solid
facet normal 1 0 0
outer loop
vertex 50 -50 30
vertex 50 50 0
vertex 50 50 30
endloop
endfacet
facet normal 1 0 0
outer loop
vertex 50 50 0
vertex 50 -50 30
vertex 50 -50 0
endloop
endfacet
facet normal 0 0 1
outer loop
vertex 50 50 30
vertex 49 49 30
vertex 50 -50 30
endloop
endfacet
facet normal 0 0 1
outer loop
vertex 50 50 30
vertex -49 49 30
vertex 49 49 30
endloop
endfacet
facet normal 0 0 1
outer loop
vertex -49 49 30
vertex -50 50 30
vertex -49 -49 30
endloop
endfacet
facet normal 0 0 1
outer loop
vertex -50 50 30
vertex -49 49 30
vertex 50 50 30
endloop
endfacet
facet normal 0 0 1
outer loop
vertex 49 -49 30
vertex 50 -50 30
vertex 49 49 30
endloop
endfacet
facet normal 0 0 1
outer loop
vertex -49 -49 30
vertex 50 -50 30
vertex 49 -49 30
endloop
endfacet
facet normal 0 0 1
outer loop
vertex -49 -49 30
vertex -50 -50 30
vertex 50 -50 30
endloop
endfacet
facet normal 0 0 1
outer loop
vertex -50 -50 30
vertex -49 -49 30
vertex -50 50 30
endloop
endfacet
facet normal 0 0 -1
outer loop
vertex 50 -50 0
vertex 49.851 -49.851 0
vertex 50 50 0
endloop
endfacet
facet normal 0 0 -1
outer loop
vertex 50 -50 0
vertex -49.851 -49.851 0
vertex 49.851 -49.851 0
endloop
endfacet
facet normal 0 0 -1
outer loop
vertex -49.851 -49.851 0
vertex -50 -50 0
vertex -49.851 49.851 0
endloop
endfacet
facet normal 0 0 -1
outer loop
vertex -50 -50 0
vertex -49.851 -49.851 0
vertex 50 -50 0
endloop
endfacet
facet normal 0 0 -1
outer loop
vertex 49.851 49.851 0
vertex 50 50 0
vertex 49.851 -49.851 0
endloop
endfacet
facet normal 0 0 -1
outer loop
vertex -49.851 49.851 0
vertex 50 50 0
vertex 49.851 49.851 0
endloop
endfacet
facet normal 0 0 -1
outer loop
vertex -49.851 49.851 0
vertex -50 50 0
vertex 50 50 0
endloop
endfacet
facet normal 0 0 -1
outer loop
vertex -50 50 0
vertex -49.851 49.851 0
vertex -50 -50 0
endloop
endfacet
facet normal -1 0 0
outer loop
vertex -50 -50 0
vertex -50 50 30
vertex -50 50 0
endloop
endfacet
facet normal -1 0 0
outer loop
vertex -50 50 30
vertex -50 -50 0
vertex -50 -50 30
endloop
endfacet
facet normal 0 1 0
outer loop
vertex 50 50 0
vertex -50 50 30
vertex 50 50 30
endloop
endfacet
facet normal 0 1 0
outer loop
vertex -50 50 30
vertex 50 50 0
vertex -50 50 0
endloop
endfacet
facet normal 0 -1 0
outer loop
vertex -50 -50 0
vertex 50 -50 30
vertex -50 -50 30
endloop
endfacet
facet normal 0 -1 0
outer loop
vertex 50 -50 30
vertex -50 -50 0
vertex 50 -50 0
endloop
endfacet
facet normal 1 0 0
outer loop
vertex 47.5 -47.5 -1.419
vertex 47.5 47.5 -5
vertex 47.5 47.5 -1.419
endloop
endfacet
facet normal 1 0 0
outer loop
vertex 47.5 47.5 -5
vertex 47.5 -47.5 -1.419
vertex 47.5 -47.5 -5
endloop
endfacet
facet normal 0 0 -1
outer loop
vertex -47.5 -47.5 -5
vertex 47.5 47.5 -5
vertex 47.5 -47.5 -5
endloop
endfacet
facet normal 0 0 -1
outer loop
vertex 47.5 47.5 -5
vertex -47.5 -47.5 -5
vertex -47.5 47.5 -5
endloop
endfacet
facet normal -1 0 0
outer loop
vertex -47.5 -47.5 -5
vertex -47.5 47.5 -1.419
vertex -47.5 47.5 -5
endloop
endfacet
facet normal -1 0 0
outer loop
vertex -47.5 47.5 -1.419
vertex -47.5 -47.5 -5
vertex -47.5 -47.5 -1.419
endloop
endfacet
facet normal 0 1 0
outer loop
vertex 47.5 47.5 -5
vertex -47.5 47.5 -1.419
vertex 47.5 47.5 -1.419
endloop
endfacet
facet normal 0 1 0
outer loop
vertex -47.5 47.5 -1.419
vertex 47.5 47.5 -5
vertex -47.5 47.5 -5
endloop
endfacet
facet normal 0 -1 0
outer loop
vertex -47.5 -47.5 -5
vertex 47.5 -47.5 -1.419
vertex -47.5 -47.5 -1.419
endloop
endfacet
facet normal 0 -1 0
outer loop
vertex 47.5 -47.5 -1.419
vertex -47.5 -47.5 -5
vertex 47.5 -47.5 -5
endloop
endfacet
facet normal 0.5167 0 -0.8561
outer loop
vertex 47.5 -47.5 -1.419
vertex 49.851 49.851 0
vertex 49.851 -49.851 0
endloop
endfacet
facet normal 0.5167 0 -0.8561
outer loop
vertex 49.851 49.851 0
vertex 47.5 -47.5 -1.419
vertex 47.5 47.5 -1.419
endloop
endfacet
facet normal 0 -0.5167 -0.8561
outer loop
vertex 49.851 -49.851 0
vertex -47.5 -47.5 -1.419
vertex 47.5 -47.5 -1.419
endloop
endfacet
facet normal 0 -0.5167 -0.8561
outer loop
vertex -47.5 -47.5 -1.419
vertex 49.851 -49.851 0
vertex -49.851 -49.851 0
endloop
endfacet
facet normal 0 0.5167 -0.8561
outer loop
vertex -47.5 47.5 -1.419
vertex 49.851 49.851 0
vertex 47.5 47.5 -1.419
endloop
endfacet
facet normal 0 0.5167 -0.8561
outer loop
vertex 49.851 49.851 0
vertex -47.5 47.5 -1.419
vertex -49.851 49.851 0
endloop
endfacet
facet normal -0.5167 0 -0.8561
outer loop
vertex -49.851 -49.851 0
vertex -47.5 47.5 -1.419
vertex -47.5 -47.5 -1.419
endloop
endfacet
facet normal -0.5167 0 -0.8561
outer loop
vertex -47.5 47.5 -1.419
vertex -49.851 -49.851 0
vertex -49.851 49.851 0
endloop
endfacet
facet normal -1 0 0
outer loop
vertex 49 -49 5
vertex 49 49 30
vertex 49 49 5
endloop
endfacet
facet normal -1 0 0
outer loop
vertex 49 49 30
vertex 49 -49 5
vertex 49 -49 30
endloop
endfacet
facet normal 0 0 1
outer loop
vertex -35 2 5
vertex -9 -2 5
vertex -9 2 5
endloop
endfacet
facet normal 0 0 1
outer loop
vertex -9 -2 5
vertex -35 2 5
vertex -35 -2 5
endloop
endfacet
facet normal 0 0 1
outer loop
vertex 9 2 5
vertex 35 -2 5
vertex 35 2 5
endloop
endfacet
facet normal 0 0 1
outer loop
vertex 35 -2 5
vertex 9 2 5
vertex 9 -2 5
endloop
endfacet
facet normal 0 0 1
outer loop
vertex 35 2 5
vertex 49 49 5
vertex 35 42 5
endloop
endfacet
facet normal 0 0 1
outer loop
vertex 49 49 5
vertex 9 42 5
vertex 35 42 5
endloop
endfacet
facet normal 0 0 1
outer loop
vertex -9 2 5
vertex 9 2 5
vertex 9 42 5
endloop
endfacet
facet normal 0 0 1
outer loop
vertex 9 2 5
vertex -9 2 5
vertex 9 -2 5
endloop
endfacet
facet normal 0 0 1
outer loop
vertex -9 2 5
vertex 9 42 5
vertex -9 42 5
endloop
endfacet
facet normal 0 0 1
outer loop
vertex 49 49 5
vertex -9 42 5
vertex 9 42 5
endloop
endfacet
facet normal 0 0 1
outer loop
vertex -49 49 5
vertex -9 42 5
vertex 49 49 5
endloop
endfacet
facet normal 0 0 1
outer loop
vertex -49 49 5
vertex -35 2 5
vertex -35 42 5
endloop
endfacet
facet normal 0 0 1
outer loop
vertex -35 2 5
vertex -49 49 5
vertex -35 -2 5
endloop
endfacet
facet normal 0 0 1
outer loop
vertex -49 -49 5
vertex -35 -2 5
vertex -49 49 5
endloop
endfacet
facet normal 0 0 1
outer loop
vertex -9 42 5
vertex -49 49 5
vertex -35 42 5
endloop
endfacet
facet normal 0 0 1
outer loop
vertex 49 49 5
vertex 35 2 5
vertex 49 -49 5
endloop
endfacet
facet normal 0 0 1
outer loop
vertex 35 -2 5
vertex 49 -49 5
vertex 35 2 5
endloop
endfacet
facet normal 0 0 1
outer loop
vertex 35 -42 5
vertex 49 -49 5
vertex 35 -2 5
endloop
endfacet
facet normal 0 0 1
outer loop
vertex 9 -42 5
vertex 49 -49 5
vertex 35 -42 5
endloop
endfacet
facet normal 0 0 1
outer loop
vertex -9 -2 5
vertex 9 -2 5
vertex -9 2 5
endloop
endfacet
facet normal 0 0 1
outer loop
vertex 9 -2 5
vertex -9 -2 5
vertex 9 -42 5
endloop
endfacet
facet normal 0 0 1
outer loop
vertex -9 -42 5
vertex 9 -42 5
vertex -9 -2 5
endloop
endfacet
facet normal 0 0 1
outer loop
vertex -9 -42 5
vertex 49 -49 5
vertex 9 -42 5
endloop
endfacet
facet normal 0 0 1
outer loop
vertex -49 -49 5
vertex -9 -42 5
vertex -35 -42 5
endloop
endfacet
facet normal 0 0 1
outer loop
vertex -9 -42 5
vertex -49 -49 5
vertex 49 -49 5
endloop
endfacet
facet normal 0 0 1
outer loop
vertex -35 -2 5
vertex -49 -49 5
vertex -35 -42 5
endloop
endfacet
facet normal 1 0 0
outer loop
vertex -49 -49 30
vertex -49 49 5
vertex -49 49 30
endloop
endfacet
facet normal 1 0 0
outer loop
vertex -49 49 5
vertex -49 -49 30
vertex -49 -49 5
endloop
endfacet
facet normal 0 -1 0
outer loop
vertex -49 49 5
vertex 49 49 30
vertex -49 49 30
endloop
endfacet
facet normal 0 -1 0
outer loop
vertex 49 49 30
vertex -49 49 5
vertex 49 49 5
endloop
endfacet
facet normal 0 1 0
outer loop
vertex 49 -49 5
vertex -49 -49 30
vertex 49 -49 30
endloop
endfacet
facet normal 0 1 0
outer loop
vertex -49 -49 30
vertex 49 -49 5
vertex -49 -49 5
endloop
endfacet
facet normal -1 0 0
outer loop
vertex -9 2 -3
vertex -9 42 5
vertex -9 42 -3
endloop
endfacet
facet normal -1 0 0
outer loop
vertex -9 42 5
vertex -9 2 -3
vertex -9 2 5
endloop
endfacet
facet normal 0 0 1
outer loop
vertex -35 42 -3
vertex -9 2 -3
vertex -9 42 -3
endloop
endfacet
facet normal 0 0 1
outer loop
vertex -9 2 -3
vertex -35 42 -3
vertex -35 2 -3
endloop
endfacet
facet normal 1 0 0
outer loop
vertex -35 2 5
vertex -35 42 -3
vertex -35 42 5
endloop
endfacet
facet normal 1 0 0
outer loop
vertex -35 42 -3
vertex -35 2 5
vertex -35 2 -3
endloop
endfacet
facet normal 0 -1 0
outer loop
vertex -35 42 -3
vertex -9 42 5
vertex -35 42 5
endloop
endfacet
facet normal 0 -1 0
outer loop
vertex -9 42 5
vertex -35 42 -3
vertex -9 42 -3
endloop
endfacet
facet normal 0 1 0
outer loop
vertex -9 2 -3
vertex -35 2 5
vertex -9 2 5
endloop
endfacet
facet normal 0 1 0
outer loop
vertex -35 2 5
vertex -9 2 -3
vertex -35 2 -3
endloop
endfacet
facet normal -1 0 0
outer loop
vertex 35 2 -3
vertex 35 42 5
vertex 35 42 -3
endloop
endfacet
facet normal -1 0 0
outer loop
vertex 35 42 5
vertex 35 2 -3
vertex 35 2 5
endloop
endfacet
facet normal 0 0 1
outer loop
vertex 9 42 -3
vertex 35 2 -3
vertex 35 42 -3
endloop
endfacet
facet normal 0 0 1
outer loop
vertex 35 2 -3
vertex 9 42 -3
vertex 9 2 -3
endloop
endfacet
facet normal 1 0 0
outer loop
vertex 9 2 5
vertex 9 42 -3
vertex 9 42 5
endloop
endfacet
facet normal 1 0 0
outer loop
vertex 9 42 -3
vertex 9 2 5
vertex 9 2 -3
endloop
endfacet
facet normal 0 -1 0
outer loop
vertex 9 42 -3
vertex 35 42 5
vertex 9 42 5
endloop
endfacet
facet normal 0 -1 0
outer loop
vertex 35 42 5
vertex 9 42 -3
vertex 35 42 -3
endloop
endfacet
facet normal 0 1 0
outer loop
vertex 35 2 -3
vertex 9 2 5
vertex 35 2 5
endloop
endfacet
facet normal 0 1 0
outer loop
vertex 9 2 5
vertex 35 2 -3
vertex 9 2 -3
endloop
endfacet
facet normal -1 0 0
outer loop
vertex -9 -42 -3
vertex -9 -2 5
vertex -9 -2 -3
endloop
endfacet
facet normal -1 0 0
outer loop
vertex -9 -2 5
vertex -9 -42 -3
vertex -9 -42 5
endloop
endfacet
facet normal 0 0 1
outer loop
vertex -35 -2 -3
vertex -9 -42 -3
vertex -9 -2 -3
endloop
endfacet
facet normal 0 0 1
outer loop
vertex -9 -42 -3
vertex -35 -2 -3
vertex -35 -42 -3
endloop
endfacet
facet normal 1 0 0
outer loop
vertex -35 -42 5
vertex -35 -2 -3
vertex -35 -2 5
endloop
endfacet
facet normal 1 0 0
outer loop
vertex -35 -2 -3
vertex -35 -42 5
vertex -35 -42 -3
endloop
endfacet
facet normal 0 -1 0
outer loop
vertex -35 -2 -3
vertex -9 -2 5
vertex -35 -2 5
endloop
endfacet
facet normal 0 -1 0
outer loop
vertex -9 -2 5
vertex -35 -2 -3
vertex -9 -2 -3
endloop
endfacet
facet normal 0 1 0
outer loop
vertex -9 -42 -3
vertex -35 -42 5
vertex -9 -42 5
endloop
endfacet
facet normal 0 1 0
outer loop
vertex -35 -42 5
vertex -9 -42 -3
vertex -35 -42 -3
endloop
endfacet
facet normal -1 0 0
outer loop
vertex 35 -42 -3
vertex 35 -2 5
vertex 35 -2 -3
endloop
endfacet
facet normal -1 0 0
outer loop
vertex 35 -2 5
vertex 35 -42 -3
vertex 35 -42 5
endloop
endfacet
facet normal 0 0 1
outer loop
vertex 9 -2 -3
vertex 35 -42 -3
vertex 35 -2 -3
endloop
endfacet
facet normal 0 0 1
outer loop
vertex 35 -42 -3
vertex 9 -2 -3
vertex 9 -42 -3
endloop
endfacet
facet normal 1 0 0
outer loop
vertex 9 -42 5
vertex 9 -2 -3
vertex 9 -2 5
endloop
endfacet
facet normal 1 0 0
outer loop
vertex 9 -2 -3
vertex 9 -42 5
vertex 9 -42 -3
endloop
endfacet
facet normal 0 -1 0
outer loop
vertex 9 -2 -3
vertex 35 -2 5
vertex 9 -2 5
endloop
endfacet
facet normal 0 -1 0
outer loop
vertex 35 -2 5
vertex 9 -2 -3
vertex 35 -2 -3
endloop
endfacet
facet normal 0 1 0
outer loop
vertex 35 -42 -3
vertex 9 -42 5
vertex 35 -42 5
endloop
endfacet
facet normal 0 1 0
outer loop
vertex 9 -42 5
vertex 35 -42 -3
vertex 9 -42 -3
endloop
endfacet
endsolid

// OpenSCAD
H=30;               // Height of main box
H2=5;               // Height of bottom centering
SIDE=100;           // Side of box
D=2;                // Wall-thickness of box
D2=2.5;             // Setback of centering
HI=25;              // Inner Cut-Out

difference() {
    union() {
        translate([0,0,H/2]) cube([SIDE,SIDE,H], center=true );                                     // Main Box 100x100x40
        translate([0,0,-H2/2]) cube([SIDE-2*D2,SIDE-2*D2,H2],center=true);                          // Bottom
        translate([0,0,-2]) rotate([0,0,45]) cylinder(h=2,d1=1.35*(SIDE-D2),d2=1.41*SIDE,$fn=4);    // Chamfer
    }
    translate([0,0, 2*H-HI]) cube([SIDE-D,SIDE-D,2*H],center=true);                                  // Inner Cut-Out

    translate([ -22, 22,10]) cube([26,40,26], center=true); // Rect-Tokens
    translate([  22, 22,10]) cube([26,40,26], center=true); // Rect-Tokens
    translate([ -22,-22,10]) cube([26,40,26], center=true); // Rect-Tokens
    translate([  22,-22,10]) cube([26,40,26], center=true); // Rect-Tokens
    
//    translate([0,-70,0]) cube([300,200,300],center=true); // Tester
   
}
